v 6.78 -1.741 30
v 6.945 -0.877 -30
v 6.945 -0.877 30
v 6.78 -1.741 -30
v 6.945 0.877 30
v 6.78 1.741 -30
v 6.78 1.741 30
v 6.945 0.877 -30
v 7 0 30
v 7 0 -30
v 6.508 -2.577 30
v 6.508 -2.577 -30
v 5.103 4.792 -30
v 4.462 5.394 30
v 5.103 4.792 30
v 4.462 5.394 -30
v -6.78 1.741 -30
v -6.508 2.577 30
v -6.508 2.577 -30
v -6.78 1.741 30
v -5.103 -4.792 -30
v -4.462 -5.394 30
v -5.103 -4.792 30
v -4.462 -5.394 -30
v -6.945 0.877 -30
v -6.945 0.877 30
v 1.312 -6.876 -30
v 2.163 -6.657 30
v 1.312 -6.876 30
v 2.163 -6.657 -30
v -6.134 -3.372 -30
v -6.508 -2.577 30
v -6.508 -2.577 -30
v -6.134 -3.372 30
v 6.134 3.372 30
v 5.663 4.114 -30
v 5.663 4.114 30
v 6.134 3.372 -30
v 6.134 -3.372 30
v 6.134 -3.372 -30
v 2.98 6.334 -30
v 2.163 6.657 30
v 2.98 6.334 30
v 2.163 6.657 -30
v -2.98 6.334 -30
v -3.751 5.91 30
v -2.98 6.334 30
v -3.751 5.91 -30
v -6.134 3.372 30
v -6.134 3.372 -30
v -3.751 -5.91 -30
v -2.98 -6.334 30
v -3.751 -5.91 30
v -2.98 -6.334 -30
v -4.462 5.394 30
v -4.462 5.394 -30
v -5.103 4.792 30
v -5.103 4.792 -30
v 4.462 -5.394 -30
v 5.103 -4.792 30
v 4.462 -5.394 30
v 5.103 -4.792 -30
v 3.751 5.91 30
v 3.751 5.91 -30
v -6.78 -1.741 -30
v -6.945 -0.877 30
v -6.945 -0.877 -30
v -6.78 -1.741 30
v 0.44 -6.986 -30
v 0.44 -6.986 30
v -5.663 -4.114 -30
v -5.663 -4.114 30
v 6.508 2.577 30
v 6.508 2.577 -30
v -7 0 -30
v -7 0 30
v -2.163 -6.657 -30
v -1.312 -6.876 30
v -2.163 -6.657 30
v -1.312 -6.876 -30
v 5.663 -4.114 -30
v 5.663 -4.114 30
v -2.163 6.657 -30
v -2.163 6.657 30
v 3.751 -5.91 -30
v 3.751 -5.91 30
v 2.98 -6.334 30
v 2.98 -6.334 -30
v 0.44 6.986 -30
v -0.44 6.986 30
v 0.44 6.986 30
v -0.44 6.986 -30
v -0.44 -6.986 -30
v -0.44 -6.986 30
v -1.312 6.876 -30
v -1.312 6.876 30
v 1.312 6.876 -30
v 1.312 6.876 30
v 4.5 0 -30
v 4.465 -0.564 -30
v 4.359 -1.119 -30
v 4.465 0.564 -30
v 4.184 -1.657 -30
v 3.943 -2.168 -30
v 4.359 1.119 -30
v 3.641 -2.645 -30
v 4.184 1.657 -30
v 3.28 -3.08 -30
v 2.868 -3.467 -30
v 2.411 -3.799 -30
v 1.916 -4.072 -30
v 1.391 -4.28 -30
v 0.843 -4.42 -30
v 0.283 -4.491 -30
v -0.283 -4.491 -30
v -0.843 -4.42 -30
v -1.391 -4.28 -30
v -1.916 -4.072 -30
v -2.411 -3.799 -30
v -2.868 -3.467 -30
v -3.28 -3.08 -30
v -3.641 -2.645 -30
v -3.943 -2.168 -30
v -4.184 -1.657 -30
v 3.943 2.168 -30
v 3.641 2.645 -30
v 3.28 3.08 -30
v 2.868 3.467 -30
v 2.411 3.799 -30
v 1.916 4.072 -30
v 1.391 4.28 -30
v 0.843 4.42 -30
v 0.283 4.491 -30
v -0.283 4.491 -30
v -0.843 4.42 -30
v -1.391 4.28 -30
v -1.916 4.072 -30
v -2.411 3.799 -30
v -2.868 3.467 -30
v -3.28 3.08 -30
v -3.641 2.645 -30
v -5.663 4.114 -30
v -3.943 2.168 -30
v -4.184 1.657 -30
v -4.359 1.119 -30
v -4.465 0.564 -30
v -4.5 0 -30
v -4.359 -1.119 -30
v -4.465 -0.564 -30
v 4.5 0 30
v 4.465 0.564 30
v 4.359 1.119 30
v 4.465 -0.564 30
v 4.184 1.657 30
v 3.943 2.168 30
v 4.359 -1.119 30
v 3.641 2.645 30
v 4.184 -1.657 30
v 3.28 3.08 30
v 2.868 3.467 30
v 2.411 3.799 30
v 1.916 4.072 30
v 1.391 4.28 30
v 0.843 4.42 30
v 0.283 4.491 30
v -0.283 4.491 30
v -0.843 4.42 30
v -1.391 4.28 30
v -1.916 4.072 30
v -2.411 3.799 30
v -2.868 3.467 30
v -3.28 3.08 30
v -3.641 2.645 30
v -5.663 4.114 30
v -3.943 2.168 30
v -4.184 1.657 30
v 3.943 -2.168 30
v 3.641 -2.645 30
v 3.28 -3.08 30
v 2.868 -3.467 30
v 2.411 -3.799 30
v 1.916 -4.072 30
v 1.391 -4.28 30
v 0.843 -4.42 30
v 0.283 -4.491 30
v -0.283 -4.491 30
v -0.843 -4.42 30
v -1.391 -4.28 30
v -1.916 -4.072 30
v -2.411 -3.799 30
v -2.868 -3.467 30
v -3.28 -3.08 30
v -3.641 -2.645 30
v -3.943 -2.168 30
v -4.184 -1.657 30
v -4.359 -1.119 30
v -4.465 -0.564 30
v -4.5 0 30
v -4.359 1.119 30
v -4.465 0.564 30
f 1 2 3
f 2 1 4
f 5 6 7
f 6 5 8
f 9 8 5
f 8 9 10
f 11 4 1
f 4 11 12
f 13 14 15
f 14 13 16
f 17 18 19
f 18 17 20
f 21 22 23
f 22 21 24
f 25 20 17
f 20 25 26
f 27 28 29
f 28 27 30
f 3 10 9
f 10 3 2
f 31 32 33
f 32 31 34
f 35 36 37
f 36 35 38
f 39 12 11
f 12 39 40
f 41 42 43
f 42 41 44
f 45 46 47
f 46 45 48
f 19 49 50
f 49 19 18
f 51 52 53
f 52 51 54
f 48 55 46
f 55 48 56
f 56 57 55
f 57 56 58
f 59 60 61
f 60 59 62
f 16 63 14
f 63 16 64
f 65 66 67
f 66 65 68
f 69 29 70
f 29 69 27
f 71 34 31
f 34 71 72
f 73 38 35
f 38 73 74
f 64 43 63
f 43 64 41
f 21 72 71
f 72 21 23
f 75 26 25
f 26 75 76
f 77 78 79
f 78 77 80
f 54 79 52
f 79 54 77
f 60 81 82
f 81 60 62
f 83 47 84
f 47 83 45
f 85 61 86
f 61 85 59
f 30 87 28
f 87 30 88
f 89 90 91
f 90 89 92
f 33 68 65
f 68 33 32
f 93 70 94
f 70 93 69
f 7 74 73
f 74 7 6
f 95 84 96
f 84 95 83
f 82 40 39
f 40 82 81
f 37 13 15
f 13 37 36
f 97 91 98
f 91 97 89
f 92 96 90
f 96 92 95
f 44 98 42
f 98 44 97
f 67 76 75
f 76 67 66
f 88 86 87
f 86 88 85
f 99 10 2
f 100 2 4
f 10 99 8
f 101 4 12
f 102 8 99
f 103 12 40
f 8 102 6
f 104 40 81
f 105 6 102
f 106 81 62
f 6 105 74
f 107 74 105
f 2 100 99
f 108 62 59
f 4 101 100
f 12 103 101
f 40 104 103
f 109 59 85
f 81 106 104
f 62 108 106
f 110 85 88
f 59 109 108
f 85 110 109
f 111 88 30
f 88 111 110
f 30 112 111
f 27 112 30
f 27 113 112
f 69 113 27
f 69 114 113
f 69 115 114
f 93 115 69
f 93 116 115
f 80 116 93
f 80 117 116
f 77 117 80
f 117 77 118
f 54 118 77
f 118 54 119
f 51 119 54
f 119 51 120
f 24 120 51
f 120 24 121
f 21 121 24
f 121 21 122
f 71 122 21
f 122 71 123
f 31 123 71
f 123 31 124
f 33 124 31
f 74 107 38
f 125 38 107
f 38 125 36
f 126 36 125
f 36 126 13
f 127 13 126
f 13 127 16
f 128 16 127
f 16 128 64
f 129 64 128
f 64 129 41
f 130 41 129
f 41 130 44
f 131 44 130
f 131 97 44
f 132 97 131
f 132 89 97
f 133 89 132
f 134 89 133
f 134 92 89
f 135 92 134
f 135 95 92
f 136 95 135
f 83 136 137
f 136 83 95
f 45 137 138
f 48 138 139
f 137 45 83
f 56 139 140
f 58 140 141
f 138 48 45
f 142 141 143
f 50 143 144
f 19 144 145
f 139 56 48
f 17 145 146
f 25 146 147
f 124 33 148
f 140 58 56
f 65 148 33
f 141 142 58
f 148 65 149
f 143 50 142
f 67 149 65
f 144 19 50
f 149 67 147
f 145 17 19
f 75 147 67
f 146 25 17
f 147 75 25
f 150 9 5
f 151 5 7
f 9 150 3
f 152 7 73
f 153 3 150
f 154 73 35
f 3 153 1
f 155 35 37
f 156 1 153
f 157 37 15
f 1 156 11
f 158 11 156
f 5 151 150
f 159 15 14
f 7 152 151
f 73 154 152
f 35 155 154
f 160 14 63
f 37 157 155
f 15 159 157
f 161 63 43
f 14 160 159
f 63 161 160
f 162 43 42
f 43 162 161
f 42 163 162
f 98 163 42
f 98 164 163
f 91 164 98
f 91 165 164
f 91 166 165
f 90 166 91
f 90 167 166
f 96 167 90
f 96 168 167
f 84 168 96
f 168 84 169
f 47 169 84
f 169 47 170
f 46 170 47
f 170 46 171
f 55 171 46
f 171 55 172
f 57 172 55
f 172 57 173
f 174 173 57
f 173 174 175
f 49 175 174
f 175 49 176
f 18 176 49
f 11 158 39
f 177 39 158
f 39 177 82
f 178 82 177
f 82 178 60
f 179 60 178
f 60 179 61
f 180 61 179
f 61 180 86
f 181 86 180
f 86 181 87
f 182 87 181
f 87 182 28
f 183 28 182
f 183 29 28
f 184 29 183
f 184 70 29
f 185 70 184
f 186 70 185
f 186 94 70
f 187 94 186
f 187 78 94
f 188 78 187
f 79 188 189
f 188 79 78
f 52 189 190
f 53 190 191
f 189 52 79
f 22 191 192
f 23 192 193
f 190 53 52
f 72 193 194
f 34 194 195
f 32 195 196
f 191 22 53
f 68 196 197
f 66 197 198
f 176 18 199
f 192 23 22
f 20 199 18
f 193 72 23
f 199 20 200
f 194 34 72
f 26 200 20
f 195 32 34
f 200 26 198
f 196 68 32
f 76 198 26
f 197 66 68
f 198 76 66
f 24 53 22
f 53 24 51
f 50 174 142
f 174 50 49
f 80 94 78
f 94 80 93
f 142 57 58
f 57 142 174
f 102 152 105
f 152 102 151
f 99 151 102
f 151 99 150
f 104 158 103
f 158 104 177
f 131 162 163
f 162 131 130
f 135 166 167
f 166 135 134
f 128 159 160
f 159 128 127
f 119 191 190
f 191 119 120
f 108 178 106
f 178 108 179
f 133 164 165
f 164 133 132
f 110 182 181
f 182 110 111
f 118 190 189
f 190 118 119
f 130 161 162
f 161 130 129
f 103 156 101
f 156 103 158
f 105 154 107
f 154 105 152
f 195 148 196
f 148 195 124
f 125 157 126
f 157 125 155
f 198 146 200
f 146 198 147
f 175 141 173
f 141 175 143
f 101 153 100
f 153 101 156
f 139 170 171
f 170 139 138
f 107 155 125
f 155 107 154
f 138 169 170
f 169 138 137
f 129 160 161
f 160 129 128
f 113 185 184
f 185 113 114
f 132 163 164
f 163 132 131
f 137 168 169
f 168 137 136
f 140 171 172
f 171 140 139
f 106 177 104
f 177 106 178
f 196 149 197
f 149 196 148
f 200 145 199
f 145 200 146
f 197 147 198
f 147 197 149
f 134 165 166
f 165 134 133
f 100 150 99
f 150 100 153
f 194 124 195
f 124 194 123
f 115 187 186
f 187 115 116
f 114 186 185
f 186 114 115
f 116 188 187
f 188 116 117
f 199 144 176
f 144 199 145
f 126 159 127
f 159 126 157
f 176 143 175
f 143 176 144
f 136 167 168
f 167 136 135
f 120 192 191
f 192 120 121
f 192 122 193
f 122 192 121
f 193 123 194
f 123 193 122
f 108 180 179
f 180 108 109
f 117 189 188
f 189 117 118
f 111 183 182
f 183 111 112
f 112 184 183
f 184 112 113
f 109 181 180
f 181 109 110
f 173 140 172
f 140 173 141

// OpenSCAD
$fn = 50;


difference() {
	union() {
		translate(v = [0, 0, -30.0000000000]) {
			cylinder(h = 60, r = 7.0000000000);
		}
	}
	union() {
		translate(v = [0, 0, -100.0000000000]) {
			cylinder(h = 200, r = 4.5000000000);
		}
	}
}
